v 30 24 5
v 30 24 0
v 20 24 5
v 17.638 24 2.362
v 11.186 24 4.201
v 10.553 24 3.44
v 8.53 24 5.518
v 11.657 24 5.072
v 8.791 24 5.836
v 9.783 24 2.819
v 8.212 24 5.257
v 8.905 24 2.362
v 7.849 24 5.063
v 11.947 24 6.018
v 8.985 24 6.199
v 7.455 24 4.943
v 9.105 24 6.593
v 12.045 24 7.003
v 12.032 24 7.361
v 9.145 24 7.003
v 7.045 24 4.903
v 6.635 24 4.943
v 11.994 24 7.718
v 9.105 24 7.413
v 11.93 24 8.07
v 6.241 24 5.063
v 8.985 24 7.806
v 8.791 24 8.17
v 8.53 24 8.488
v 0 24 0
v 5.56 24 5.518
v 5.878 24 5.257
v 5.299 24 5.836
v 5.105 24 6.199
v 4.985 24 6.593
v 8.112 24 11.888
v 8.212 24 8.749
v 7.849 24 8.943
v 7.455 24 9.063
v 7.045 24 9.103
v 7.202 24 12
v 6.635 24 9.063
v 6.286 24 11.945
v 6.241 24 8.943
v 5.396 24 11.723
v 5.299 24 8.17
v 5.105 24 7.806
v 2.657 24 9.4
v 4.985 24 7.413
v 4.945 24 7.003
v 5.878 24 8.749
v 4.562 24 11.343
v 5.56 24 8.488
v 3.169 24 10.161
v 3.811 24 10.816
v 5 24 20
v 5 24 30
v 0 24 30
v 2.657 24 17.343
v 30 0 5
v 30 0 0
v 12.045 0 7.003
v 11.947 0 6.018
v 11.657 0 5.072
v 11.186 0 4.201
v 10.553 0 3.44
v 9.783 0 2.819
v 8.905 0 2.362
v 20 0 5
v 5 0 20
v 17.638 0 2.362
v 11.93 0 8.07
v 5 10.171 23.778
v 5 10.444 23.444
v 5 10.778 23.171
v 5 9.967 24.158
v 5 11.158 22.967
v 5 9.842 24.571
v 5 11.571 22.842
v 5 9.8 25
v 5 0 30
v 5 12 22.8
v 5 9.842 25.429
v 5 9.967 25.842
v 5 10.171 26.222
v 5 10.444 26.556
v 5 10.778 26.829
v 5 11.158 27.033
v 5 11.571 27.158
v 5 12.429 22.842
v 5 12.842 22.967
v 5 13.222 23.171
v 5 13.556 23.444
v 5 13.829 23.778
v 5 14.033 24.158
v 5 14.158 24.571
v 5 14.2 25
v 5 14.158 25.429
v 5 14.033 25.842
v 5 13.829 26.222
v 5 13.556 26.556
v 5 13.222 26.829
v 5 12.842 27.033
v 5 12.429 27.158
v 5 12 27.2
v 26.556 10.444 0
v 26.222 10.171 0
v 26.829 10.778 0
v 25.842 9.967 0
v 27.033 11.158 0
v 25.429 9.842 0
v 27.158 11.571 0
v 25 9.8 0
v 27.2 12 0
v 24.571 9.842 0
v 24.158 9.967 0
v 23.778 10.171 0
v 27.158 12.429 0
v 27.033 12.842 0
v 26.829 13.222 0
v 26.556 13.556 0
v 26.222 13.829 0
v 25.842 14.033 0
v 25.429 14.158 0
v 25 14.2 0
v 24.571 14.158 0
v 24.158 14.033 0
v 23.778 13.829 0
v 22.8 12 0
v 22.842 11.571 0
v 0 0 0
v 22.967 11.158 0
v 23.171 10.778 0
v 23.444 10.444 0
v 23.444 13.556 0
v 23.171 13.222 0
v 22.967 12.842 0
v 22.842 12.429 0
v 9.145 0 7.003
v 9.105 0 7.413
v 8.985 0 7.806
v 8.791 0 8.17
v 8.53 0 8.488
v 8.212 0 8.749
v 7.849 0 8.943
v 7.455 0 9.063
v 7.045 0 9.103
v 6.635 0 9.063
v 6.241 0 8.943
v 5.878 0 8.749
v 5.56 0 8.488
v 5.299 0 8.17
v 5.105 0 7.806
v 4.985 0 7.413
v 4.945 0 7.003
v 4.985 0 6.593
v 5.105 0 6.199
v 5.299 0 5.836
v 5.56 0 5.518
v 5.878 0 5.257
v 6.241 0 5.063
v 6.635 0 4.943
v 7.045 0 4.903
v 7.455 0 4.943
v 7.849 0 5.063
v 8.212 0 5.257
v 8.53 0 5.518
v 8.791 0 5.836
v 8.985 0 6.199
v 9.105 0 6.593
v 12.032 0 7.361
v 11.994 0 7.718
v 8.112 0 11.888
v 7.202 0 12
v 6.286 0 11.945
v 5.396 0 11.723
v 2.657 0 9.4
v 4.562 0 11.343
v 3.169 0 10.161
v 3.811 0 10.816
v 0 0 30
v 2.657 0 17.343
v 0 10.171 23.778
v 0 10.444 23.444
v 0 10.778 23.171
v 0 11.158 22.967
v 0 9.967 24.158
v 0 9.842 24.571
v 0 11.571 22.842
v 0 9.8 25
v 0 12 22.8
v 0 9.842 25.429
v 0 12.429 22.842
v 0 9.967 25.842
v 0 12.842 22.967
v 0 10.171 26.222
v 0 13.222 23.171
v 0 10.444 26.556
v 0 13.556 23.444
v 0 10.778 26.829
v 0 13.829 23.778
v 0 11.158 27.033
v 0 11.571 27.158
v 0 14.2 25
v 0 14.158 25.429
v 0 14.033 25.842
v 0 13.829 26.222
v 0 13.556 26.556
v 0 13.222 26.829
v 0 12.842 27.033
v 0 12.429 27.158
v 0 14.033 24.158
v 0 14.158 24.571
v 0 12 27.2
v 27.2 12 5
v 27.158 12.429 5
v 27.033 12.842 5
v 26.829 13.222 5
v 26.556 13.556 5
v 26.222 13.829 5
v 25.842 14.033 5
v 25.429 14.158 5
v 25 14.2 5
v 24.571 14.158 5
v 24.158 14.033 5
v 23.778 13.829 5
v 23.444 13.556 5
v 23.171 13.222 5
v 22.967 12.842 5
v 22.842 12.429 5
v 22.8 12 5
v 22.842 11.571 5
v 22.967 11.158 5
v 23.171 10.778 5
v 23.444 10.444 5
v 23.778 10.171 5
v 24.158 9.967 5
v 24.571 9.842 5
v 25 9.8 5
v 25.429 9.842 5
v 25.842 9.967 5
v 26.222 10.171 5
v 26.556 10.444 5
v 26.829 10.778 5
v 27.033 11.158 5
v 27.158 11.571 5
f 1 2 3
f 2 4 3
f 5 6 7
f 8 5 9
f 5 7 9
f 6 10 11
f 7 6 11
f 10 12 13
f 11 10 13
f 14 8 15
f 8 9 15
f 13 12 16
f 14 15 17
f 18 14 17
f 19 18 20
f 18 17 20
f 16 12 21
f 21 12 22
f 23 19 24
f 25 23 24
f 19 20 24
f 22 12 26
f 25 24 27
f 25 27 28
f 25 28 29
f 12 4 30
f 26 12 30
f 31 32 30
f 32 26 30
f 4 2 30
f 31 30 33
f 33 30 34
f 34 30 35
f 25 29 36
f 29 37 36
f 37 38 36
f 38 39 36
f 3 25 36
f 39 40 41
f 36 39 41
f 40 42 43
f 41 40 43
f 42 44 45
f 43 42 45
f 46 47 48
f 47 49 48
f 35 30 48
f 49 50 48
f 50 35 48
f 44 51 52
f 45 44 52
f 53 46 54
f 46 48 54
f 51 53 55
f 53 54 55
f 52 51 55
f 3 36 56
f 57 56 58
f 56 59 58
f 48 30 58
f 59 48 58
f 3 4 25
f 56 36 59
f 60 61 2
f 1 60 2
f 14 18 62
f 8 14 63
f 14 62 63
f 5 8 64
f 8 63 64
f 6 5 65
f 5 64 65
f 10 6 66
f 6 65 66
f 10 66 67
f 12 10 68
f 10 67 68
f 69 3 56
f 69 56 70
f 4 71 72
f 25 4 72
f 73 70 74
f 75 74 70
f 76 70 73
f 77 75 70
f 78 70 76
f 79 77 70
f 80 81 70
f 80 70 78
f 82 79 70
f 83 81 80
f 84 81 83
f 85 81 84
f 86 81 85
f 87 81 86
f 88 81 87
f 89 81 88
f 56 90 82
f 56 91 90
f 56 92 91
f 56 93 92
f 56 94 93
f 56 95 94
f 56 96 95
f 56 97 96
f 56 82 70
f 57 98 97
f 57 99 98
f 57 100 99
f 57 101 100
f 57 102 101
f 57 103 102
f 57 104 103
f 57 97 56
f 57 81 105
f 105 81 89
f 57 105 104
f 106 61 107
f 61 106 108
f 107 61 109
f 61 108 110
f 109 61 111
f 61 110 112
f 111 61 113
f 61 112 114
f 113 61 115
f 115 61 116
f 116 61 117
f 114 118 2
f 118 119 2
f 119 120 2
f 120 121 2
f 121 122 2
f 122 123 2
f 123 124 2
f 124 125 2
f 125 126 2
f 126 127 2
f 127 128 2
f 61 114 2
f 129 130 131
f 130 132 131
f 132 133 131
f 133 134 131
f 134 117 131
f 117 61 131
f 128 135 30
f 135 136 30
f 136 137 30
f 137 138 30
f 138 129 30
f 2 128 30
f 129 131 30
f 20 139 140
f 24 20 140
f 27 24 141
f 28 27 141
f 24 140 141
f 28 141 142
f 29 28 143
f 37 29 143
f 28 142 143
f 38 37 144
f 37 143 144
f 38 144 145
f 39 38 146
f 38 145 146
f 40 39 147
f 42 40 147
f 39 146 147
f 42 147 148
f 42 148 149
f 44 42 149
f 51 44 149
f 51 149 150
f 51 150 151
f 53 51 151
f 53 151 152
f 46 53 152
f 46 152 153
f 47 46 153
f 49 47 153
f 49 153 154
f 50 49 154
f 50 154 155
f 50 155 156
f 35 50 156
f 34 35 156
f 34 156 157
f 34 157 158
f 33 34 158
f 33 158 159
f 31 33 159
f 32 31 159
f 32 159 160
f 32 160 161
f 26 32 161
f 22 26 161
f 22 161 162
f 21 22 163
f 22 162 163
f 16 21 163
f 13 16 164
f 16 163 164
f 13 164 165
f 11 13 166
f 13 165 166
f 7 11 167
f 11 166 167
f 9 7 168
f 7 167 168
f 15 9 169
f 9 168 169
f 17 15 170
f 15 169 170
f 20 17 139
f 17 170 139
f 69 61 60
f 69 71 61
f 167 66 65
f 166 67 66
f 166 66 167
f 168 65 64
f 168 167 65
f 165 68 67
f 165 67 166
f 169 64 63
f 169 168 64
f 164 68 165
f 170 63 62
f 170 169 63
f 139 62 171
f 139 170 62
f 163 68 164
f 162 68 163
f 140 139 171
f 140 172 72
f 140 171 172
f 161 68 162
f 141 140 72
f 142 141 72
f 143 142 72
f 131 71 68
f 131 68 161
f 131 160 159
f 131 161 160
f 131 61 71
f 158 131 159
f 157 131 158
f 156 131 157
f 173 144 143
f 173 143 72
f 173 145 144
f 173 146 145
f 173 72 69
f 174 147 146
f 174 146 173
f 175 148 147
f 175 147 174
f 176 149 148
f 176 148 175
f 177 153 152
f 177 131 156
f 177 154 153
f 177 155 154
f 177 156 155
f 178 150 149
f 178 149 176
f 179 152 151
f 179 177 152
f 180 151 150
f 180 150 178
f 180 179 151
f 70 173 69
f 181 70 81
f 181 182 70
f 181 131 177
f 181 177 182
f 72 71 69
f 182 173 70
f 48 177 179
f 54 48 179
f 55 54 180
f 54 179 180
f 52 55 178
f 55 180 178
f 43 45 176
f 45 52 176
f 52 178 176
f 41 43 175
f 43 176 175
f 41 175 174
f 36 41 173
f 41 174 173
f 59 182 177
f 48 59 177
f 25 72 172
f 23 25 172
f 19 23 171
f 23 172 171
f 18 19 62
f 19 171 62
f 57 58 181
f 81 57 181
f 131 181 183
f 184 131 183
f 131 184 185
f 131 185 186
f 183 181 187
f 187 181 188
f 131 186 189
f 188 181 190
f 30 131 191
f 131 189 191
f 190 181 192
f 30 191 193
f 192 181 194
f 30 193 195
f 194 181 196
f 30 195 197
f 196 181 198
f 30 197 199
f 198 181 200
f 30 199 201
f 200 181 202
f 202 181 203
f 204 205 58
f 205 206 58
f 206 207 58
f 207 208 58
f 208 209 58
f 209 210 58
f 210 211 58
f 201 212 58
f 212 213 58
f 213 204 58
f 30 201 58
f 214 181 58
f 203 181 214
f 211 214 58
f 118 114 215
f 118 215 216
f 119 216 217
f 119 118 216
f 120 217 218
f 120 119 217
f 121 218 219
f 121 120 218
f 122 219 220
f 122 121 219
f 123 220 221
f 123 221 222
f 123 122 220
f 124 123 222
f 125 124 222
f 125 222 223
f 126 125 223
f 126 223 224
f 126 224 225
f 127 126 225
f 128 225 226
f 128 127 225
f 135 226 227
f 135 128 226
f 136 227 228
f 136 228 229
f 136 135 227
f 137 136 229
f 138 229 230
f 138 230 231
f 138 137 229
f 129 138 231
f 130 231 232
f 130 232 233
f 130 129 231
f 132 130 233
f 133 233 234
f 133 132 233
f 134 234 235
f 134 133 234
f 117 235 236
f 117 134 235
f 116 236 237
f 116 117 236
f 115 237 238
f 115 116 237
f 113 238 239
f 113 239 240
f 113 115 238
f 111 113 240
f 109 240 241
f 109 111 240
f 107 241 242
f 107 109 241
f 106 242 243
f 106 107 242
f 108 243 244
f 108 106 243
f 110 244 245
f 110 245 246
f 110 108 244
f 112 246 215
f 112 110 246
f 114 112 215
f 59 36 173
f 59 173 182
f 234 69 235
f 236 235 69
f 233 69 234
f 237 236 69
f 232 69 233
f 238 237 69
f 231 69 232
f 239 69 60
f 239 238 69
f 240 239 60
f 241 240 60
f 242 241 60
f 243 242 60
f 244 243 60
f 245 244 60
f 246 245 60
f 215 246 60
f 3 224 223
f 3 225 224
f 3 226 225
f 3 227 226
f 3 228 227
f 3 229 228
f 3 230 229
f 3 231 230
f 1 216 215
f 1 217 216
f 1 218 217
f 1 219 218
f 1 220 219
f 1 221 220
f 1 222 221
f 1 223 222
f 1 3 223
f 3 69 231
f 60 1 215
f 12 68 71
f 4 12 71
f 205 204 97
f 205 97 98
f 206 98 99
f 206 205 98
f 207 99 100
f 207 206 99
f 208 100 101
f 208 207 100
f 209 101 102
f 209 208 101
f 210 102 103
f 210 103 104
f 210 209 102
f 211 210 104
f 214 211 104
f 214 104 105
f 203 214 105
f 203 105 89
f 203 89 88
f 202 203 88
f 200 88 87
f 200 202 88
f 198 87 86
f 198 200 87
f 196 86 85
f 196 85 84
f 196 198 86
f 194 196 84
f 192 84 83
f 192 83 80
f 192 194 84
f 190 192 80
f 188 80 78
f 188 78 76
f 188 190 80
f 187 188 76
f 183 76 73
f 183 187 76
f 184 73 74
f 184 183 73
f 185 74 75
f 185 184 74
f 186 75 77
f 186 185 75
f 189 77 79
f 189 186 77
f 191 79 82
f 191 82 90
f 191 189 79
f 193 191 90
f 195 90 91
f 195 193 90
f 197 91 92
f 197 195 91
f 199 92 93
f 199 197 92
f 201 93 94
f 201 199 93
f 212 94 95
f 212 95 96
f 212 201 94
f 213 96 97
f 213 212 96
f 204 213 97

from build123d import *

# Parameters (mm, degrees)
F1_W     = 8
F1_H     = 30
F1_R     = 2.2
F2_DEPTH = 5
F0_W     = 30
F0_H     = 8
F0_R     = 2.2
F3_DEPTH = 5
F5_SIZE  = 15
F4_R     = 2.1
F6_DEPTH = 30


with BuildPart() as f2:
    # F1 (on Right) → F2 (new body)
    with BuildSketch(Plane.YZ):
        with Locations((20, 15)):
            Rectangle(F1_W, F1_H)
        with Locations((12, 15)):
            Rectangle(F1_W, F1_H)
        with Locations((12.000000596, 25)):
            Circle(F1_R, mode=Mode.SUBTRACT)
        with Locations((4, 15)):
            Rectangle(F1_W, F1_H)
    extrude(amount=F2_DEPTH)

    # F0 (on Top) → F3 (join)
    with BuildSketch(Plane.XY):
        with Locations((15, 20)):
            Rectangle(F0_W, F0_H)
        with Locations((15, 12)):
            Rectangle(F0_W, F0_H)
        with Locations((25, 12)):
            Circle(F0_R, mode=Mode.SUBTRACT)
        with Locations((15, 4)):
            Rectangle(F0_W, F0_H)
    extrude(amount=F3_DEPTH)

    # F5
    f5_edges = [f2.edges().sort_by_distance(p)[0] for p in [
        (5, 12, 5),
    ]]
    chamfer(f5_edges, length=F5_SIZE)

    # F4 (on Front) → F6 (cut)
    with BuildSketch(Plane.XZ):
        with BuildLine():
            Line((8.9047972998, 2.3616264964), (17.6383735036, 2.3616264964))
            Line((17.6383735036, 2.3616264964), (11.929701132, 8.070298868))
            ThreePointArc((11.929701132, 8.070298868), (12.0160710439, 7.5396825646), (12.0449723862, 7.0028603077))
            ThreePointArc((12.0449723862, 7.0028603077), (11.1861753858, 4.2009970498), (8.9047972998, 2.3616264964))
        make_face()
        with BuildLine():
            ThreePointArc((2.6568189153, 9.3995474202), (4.970273692, 11.5521047865), (8.1124109465, 11.8875890535))
            Line((8.1124109465, 11.8875890535), (2.6568189153, 17.3431810847))
            Line((2.6568189153, 17.3431810847), (2.6568189153, 9.3995474202))
        make_face()
        with Locations((7.0449723862, 7.0028603077)):
            Circle(F4_R)
    extrude(amount=-F6_DEPTH, mode=Mode.SUBTRACT)


solid = f2.part
